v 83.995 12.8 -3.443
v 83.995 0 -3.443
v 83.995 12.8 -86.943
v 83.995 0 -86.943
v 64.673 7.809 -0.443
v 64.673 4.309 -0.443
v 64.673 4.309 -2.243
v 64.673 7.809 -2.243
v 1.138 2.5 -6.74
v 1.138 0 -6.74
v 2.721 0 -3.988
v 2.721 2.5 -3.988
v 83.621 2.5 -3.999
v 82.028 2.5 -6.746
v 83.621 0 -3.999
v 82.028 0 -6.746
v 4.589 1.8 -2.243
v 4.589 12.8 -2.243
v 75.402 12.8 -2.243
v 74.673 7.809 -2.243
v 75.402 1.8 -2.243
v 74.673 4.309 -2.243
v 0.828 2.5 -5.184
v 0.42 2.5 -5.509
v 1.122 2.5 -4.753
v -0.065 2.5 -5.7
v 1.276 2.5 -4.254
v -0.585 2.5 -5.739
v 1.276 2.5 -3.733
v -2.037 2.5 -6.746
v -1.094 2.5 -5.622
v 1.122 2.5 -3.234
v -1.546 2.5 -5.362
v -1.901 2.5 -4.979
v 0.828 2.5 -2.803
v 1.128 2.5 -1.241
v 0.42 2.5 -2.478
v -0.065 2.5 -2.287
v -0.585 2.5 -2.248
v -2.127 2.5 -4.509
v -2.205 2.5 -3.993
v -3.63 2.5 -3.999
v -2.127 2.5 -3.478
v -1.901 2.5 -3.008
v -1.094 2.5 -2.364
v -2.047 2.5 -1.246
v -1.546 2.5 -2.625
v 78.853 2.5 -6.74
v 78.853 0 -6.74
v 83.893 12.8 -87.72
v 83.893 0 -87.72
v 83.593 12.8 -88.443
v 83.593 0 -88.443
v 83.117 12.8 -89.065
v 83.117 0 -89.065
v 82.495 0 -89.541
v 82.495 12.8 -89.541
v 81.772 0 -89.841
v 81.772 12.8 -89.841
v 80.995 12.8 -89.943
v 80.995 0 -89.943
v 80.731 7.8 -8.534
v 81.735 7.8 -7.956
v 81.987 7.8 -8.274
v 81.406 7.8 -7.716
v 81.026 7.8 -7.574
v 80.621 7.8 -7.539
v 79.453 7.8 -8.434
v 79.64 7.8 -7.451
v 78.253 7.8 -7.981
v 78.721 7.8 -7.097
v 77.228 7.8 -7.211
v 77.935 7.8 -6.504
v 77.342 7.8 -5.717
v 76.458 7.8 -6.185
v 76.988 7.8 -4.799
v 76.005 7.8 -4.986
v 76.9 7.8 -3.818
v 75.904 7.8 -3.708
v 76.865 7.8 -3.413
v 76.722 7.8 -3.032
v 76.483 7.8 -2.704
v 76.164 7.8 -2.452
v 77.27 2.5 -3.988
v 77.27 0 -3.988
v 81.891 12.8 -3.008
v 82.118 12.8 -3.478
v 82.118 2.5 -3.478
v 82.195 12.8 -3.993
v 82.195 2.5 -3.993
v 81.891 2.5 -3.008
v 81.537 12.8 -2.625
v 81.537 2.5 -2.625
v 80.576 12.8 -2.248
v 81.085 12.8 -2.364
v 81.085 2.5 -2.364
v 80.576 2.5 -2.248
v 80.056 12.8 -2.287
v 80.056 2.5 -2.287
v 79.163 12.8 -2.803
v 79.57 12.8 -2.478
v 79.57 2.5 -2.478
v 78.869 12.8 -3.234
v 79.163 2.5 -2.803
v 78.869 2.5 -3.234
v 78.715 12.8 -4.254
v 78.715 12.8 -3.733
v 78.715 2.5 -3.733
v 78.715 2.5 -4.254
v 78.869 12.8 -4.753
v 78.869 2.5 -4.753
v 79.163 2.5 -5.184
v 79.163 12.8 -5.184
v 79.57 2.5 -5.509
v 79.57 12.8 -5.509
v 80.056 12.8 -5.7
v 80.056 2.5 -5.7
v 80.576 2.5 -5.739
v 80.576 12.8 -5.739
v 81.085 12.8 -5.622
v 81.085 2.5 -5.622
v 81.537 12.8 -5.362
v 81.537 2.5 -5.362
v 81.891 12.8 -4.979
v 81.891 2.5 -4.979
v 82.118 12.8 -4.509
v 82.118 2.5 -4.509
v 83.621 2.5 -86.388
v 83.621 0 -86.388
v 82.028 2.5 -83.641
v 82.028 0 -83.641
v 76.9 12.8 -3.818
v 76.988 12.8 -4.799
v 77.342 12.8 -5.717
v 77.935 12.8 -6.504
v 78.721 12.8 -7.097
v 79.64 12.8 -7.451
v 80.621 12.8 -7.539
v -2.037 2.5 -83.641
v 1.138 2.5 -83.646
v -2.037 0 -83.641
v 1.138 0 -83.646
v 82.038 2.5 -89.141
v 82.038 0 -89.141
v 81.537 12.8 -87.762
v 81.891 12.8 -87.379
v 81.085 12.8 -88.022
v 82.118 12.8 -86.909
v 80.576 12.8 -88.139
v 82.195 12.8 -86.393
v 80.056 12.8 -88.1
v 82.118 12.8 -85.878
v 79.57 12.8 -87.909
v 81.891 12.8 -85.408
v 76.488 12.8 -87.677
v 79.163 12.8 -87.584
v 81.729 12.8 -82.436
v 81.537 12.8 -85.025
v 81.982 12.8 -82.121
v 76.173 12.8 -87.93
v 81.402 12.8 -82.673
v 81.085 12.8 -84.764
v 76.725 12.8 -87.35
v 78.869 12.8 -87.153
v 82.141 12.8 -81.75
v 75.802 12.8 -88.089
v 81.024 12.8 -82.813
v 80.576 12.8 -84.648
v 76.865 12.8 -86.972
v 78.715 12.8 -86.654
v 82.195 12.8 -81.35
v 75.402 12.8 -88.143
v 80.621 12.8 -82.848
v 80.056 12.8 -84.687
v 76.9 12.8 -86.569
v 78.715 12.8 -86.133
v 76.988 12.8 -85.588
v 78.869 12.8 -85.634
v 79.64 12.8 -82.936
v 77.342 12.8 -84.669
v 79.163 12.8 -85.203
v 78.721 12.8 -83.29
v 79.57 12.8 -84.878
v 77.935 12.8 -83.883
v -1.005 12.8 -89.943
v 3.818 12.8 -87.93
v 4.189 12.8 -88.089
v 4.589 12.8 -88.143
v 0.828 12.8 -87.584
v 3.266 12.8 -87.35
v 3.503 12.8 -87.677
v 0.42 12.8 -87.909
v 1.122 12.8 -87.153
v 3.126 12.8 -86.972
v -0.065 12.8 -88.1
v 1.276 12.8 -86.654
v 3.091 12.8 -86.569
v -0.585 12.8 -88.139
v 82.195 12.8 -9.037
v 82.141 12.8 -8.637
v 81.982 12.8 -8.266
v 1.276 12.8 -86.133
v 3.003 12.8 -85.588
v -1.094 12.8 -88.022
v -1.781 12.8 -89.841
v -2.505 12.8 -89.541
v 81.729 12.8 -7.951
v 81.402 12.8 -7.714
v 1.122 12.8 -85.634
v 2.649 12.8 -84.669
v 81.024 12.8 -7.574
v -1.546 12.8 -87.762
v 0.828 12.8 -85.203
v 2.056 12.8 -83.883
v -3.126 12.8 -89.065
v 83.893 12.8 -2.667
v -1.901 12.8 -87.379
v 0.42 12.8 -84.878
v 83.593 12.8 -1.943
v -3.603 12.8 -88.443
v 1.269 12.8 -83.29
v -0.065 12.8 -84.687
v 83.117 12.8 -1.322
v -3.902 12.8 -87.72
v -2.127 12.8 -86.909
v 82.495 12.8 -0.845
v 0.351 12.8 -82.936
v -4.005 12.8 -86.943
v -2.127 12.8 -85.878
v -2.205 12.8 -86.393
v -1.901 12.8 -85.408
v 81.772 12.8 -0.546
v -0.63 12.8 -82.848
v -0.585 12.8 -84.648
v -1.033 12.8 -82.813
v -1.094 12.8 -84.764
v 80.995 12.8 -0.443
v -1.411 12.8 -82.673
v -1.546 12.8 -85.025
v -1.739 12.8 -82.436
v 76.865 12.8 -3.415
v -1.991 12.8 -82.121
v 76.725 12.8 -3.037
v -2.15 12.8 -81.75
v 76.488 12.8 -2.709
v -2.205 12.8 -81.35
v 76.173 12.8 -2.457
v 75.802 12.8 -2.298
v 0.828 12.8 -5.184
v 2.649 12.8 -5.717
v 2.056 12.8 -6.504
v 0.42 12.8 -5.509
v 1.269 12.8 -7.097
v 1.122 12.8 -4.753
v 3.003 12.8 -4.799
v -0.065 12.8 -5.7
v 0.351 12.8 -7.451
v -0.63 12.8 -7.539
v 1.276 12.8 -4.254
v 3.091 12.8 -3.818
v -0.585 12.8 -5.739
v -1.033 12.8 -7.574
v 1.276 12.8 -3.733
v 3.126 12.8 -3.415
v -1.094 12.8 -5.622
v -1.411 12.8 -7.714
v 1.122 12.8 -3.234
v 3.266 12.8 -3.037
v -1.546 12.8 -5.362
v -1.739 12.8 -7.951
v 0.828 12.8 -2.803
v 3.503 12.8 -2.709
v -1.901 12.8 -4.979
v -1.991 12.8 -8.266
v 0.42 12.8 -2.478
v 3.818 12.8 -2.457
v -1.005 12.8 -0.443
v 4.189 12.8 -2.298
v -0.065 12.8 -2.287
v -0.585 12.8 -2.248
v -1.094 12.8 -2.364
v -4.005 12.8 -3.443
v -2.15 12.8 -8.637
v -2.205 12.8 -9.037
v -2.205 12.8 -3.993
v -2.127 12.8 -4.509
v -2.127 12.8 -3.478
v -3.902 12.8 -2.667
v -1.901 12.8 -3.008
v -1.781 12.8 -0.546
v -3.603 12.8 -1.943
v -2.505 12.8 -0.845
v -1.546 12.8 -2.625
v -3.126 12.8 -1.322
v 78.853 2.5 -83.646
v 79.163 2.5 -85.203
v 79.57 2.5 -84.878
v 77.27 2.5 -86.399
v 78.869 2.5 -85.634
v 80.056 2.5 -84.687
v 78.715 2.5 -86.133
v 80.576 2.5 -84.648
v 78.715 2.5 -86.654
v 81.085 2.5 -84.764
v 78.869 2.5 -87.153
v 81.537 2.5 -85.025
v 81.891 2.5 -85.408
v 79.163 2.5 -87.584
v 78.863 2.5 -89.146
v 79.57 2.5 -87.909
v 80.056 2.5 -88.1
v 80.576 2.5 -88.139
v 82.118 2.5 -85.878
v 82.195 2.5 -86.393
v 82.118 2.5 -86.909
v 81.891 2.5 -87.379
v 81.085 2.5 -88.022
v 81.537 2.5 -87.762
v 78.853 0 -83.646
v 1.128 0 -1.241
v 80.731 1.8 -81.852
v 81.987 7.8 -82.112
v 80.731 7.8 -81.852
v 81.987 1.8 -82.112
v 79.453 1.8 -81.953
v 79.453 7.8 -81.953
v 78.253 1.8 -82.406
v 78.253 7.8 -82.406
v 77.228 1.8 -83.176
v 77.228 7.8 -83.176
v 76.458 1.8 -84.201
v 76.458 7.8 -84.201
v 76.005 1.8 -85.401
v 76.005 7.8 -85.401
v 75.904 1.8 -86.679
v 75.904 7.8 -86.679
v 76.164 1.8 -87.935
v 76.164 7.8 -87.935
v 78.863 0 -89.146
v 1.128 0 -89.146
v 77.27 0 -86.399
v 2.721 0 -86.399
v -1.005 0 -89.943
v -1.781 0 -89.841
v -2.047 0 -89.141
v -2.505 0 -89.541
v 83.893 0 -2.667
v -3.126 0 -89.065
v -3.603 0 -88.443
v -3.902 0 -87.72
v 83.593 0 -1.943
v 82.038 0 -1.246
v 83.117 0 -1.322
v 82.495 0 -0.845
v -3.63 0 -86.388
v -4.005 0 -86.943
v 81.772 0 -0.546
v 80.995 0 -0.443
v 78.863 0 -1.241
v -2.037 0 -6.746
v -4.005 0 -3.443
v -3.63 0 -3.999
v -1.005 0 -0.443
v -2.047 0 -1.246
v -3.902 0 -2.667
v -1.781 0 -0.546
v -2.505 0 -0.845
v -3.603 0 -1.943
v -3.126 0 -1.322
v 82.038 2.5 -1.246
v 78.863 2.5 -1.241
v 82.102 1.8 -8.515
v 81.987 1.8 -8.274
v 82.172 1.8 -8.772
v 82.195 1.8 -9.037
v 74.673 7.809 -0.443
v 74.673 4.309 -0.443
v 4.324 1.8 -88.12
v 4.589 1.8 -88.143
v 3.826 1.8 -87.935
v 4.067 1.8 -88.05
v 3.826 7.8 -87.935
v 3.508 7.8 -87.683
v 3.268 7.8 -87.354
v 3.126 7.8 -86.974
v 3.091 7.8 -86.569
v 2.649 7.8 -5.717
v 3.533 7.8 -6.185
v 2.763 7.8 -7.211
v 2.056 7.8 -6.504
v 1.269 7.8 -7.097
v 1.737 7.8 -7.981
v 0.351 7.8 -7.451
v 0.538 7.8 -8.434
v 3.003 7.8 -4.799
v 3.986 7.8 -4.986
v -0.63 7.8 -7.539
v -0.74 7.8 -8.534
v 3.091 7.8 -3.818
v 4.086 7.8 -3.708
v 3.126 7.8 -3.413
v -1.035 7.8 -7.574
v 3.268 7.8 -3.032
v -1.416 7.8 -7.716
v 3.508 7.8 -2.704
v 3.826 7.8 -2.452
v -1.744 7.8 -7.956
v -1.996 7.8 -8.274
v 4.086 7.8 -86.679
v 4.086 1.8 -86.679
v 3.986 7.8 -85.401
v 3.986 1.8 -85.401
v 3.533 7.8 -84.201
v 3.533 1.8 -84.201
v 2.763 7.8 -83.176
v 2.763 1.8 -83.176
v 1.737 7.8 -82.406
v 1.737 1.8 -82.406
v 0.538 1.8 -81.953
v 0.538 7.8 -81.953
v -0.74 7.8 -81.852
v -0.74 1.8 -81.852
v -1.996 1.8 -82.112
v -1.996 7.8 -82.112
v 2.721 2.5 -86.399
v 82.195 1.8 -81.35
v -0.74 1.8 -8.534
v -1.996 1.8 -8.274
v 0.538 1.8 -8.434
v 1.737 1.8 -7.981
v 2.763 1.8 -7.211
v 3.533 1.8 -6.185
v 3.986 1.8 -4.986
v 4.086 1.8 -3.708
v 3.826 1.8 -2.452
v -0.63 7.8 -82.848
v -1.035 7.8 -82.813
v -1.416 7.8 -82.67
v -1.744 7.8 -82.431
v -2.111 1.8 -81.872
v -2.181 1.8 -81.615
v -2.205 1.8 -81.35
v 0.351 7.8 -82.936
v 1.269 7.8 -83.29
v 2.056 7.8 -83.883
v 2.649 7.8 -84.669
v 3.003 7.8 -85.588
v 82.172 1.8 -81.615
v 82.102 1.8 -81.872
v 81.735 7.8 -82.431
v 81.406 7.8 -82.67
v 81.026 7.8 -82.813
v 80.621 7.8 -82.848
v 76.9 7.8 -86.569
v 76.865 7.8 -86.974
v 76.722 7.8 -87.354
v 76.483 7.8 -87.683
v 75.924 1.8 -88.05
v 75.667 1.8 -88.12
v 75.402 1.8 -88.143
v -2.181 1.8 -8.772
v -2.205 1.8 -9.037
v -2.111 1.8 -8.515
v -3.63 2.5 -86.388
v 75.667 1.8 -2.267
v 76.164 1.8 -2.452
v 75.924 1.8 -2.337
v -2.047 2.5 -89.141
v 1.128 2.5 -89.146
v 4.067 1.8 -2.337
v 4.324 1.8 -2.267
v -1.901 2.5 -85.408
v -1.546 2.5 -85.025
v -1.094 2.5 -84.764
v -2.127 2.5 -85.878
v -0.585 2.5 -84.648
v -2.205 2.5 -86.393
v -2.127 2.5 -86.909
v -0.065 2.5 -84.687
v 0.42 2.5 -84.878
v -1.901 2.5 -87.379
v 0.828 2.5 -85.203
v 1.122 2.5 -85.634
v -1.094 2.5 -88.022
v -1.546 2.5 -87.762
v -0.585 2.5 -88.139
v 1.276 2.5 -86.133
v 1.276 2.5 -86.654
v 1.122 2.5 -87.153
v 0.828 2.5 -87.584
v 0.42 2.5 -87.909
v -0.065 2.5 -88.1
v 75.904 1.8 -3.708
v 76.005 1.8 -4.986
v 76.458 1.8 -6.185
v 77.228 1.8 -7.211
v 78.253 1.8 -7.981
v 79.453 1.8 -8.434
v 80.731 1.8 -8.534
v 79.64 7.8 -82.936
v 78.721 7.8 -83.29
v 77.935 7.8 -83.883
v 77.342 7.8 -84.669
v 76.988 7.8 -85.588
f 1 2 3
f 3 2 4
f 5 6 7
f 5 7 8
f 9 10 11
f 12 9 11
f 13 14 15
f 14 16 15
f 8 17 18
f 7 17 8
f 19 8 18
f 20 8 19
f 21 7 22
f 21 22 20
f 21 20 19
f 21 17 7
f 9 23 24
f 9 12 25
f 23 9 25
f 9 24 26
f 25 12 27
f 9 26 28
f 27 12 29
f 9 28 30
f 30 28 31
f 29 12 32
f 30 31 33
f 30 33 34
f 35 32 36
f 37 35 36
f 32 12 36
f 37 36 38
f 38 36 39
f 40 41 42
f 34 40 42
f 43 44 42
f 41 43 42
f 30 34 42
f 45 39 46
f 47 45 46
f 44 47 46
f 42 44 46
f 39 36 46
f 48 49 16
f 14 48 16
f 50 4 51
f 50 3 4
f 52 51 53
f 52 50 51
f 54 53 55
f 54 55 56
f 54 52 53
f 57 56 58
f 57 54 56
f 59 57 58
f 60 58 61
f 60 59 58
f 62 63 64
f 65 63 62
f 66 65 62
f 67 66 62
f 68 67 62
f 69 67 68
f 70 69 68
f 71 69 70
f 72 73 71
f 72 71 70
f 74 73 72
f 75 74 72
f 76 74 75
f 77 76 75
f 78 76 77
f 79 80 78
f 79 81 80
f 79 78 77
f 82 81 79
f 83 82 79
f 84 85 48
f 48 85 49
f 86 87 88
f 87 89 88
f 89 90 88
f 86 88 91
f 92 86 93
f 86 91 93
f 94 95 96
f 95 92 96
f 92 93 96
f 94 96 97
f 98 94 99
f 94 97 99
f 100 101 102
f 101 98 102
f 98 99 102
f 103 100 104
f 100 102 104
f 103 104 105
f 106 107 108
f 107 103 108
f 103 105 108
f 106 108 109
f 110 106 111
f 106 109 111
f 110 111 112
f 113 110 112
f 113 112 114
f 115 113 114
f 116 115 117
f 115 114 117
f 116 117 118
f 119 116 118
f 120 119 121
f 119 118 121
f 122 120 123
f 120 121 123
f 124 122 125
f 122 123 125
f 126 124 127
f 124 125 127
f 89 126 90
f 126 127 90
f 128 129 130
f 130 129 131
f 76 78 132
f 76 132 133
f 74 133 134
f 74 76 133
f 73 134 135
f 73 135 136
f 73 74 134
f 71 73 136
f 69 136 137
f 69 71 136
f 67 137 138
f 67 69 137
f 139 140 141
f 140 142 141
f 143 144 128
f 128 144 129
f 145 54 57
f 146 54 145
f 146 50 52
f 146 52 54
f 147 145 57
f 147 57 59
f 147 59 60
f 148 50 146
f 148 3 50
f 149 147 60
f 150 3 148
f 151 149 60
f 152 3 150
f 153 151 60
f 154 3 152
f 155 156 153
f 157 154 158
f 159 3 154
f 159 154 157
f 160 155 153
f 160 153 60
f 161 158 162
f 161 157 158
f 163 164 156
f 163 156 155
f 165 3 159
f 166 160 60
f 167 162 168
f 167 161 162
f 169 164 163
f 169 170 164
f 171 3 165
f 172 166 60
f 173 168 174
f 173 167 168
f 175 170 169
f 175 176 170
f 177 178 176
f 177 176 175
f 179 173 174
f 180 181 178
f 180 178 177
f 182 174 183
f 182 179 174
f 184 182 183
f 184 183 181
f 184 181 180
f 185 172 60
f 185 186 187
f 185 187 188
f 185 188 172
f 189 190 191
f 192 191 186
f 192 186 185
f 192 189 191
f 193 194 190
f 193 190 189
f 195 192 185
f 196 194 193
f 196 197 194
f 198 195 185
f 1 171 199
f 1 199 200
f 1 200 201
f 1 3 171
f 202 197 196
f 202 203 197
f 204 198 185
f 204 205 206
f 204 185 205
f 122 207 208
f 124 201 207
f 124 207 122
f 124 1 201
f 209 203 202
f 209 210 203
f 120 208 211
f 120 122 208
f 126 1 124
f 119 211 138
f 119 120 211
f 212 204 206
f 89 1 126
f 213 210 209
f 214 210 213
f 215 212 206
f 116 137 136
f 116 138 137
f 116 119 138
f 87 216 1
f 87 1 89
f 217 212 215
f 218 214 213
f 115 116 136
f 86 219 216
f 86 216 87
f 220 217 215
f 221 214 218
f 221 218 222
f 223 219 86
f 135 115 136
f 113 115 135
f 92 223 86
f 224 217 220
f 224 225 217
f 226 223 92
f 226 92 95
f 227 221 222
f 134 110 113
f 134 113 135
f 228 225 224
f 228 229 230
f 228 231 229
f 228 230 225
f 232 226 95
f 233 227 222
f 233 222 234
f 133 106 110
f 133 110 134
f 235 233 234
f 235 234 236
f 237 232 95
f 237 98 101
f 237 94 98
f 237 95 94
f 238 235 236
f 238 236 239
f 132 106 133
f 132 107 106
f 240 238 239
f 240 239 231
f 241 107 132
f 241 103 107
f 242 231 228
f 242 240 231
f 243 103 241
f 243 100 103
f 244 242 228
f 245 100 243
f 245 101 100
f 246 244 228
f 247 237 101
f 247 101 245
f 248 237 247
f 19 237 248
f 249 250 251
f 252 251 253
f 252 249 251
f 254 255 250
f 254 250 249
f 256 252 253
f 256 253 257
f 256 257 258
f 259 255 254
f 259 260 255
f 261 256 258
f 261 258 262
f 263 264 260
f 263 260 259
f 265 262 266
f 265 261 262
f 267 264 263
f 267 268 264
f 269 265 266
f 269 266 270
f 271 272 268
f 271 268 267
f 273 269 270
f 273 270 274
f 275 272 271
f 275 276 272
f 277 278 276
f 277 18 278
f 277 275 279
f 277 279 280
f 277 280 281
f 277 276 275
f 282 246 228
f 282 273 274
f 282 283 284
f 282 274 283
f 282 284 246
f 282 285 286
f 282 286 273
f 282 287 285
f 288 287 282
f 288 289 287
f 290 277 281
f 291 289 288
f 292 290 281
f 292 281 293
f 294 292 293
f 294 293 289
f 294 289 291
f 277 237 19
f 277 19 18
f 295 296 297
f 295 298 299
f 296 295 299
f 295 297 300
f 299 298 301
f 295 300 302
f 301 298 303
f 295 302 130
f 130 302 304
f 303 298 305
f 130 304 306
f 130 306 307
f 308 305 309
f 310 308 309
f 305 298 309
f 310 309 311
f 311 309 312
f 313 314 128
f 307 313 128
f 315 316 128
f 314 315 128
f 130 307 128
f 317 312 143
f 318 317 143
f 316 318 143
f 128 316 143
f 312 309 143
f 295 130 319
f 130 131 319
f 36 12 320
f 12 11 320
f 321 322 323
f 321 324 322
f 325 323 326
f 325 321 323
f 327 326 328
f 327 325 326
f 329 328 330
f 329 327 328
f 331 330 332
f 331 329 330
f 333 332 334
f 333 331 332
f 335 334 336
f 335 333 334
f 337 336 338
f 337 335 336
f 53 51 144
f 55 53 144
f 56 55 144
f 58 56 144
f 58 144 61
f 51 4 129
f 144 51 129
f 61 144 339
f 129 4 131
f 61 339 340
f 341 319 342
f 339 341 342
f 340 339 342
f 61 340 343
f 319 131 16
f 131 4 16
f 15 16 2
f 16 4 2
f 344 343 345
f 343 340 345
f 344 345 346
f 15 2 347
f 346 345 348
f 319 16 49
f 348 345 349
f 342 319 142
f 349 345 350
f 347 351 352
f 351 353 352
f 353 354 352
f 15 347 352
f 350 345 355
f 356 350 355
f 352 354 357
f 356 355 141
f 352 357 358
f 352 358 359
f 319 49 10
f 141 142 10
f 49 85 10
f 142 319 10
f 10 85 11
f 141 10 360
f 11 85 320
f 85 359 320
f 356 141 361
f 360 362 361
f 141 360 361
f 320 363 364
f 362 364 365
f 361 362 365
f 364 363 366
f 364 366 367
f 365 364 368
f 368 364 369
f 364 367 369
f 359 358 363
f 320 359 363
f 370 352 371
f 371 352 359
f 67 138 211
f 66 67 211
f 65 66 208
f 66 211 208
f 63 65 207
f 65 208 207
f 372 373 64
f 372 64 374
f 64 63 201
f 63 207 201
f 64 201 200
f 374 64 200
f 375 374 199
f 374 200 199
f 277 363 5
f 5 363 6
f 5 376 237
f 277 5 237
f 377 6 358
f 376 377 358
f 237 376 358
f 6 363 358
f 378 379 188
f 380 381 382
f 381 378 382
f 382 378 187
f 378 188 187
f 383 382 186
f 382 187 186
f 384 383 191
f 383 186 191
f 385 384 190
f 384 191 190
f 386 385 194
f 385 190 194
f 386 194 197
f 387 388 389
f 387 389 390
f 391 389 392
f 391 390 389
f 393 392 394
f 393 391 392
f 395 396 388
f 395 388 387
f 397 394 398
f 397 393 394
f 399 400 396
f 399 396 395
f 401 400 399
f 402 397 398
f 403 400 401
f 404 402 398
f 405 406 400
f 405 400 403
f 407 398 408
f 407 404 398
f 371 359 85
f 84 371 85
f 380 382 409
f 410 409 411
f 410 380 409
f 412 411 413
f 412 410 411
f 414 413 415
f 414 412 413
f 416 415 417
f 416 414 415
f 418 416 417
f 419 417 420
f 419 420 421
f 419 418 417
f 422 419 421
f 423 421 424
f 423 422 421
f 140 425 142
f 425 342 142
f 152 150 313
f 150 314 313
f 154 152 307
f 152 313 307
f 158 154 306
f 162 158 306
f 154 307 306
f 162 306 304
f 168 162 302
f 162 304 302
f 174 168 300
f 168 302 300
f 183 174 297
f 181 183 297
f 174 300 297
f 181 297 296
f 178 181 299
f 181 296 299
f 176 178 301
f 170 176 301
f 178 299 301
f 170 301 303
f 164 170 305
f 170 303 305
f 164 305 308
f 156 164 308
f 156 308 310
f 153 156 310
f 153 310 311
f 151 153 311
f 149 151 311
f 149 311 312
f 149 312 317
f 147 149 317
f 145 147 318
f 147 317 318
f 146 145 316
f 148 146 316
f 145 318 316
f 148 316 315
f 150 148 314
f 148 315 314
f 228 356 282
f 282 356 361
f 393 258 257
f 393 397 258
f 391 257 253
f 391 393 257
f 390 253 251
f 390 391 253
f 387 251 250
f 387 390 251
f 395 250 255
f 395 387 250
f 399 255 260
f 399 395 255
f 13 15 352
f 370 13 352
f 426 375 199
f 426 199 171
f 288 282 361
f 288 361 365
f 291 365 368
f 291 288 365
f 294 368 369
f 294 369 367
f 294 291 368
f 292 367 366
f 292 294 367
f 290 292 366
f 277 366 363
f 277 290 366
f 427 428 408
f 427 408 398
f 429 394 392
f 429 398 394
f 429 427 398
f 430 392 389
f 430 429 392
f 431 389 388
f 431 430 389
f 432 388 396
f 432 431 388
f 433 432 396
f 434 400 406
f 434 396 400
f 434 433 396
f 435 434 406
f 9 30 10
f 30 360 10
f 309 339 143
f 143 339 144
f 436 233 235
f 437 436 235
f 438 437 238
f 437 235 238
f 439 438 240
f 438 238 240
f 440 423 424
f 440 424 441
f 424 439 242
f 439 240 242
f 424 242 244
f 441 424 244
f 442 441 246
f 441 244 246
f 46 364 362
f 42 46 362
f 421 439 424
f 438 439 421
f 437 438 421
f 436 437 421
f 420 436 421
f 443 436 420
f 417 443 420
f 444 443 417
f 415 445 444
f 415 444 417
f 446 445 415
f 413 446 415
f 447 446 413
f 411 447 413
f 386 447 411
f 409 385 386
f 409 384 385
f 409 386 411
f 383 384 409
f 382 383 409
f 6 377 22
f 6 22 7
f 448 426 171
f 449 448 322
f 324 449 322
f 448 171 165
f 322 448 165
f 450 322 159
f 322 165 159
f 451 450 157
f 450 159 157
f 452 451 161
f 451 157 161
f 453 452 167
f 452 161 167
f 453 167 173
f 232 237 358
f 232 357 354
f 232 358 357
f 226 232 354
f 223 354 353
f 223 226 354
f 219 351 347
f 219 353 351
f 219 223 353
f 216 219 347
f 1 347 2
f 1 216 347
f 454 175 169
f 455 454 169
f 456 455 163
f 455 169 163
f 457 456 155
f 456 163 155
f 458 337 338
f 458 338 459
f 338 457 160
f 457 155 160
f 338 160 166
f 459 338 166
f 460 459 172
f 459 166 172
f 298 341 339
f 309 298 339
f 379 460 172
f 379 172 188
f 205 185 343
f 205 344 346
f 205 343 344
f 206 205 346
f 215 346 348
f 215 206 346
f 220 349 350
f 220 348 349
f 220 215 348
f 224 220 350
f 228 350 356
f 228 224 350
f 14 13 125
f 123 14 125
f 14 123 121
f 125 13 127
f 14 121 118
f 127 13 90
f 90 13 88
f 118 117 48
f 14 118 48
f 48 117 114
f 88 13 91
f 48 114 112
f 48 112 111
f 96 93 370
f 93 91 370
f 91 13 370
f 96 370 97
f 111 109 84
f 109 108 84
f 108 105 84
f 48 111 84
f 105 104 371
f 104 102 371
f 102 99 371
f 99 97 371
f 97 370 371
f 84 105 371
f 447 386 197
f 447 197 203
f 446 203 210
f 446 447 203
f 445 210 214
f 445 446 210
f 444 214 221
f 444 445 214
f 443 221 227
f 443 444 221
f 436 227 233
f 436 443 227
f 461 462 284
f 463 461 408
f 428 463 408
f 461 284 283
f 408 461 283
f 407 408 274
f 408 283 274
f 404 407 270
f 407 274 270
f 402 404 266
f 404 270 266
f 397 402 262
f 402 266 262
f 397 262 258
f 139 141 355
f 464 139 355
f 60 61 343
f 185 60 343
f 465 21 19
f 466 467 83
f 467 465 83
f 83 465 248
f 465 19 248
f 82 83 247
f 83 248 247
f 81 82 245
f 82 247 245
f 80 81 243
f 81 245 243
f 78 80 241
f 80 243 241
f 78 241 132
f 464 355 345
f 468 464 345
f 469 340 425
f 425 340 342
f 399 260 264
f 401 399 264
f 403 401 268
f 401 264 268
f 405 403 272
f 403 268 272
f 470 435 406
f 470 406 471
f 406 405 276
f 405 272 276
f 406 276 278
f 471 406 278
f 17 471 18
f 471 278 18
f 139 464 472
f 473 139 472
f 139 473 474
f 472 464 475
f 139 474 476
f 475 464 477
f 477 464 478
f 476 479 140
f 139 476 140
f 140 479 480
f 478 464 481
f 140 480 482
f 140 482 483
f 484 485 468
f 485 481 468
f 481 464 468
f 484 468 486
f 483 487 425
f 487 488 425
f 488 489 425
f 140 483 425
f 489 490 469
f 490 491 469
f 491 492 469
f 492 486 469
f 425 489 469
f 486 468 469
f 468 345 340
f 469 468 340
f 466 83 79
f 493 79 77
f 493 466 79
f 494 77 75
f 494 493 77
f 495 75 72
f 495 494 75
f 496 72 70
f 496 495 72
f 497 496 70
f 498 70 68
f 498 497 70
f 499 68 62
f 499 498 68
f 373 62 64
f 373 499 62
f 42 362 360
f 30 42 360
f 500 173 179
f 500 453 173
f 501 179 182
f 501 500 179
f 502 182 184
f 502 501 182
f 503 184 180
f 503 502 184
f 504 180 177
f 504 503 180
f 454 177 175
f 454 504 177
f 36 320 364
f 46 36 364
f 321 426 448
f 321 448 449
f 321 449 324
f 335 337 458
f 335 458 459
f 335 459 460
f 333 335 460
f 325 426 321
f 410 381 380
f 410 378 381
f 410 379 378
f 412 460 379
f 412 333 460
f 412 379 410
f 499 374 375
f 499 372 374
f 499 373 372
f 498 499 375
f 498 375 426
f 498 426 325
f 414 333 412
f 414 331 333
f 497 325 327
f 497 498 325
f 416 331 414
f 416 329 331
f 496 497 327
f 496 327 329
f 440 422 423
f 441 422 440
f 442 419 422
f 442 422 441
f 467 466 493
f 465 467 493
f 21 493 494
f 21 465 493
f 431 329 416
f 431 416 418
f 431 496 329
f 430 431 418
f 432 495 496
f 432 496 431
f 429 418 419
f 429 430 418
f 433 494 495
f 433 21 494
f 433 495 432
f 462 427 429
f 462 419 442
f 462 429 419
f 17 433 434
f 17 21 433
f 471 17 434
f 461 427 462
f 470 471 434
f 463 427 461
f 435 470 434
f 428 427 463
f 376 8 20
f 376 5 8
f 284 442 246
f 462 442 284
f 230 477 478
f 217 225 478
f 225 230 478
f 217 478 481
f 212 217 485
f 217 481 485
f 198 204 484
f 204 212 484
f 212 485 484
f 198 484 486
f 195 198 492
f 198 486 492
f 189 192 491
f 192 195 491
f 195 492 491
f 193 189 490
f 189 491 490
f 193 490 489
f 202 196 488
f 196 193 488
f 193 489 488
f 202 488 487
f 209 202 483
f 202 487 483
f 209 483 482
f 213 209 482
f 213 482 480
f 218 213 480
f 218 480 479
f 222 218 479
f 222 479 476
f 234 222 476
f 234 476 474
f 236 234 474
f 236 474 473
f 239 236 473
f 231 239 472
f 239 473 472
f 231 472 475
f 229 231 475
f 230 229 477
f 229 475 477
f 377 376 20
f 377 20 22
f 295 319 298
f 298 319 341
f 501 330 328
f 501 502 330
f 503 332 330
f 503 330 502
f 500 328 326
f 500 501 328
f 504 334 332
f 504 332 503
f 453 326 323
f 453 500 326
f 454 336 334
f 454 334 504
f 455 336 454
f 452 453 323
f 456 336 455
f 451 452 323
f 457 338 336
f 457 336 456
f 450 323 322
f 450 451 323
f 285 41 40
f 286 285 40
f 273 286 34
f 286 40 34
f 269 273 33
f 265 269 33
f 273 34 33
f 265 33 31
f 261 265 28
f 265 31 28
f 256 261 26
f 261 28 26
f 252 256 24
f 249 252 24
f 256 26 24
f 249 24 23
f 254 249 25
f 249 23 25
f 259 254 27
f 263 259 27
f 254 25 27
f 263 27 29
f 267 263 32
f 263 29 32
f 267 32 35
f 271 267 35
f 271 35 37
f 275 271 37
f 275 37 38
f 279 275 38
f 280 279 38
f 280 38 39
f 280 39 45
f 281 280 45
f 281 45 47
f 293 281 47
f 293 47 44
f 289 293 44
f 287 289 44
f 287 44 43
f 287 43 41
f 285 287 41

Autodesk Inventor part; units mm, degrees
ref_plane "YZ Plane" through (0, 0, 0) normal (1, 0, 0) x (0, 1, 0)
ref_plane "XZ Plane" through (0, 0, 0) normal (0, 1, 0) x (-1, 0, 0)
ref_plane "XY Plane" through (0, 0, 0) normal (0, 0, 1) x (1, 0, 0)
sketch "bottom" plane through (0, 0, 0) normal (0, 1, 0) x (-1, 0, 0)
  line L0 (4.0046, -0.4434) -> (-83.9954, -0.4434)
  line L1 (-83.9954, -0.4434) -> (-83.9954, -89.9434)
  line L2 (-83.9954, -89.9434) -> (4.0046, -89.9434)
  line L3 (4.0046, -89.9434) -> (4.0046, -0.4434)
  line L4 (2.2046, -2.2434) -> (-82.1954, -2.2434)
  line L5 (-82.1954, -2.2434) -> (-82.1954, -88.1434)
  line L6 (-82.1954, -88.1434) -> (2.2046, -88.1434)
  line L7 (2.2046, -88.1434) -> (2.2046, -2.2434)
  circle A0 centre (0.4546, -3.9934) radius 3.55
  line L8 (-39.9954, -123.8489) -> (-39.9954, 33.4211)
  line L9 (23.3841, -45.1934) -> (-117.3219, -45.1934)
  circle A1 centre (0.4546, -3.9934) radius 1.75
  circle A2 centre (-80.4454, -3.9934) radius 3.55
  circle A3 centre (-80.4454, -3.9934) radius 1.75
  circle A4 centre (0.4546, -86.3934) radius 1.75
  circle A5 centre (0.4546, -86.3934) radius 3.55
  circle A6 centre (-80.4454, -86.3934) radius 1.75
  circle A7 centre (-80.4454, -86.3934) radius 3.55
  line L10 (3.6301, -3.9991) -> (2.0374, -6.7462)
  line L11 (2.0374, -6.7462) -> (-1.138, -6.7405)
  line L12 (-1.138, -6.7405) -> (-2.7208, -3.9877)
  line L13 (-2.7208, -3.9877) -> (-1.1282, -1.2406)
  line L14 (-1.1282, -1.2406) -> (2.0472, -1.2462)
  line L15 (2.0472, -1.2462) -> (3.6301, -3.9991)
  circle A8 centre (0.4546, -3.9934) radius 4.55
  point P0 (0, 0)
  point P1 (-39.9954, -45.1934)
  point P2 (-2.6341, -2.2434)
  point P3 (2.2046, -7.0821)
  point P4 (2.2046, -83.3047)
  point P5 (-2.6341, -88.1434)
  point P6 (-77.3567, -88.1434)
  point P7 (-82.1954, -83.3047)
  point P8 (-82.1954, -7.0821)
  point P9 (-77.3567, -2.2434)
  point P10 (-39.9954, -0.4434)
  point P11 (-39.9954, -2.2434)
  point P12 (2.2046, -45.1934)
  point P13 (4.0046, -45.1934)
  point P14 (-39.9954, -45.1934)
  point P15 (-3.7454, -2.2434)
  point P16 (2.2046, -8.1934)
  dimension "d0" = 88
  dimension "d1" = 89.5
  dimension "d2" = 84.4
  dimension "d3" = 85.9
  dimension "d4" = 1.8
  dimension "d5" = 1.8
  dimension "d6" = 7.1
  dimension "d7" = 3.55
  dimension "d8" = 3.55
  dimension "d9" = 3.5
  dimension "d10" = 88
  dimension "d11" = 89.5
  dimension "d12" = 44.75
  dimension "d13" = 44
  dimension "d33" = 2.75
  dimension "d36" = 9.1
ref_plane "Work Plane3" through (39.9954, 0, -45.1934) normal (0, 0, 1) x (1, 0, 0)
ref_plane "Work Plane4" through (39.9954, 0, -45.1934) normal (1, 0, 0) x (0, 1, 0)
extrude "Extrusion4" add sketch "bottom" along normal blind 12.8 contours L3 A8 L0 | A8 L3 A0 L0 | A0 L4 A8 L0 | A0 L7 L10 L15 L14 L13 L4 | A8 L4 L8 L0 | L3 A8 L7 A0 | L4 L13 L12 L11 L10 L7 A0 | L3 L9 L7 A8 | L13 L14 L15 L10 L7 L4 | L4 A1 L7 L10 L11 L12 L13 | L4 L7 A1
extrude "Extrusion5" add sketch "bottom" along normal blind 1.8 contours A0 L7 A8 L4 | A8 L7 L9 L8 L4
fillet "Fillet3" radius 3 1 edges at (-4.0046, 6.4, -0.4434)
fillet "Fillet4" radius 1.5 2 edges at (-2.2046, 7.3, -7.0821) (2.6341, 7.3, -2.2434)
extrude "Extrusion6" cut sketch "bottom" along normal blind 2.5 contours L13 L14 L15 L10 L7 L4 | L4 A1 L7 L10 L11 L12 L13 | L4 L7 A1
extrude "pcb hight" add sketch "bottom" along normal blind 7.8 contours A0 L7 A8 L4
mirror "Mirror3" about plane through (39.9954, 0, -45.1934) normal (0, 0, 1)
mirror "Mirror4" about plane through (39.9954, 0, -45.1934) normal (1, 0, 0)
sketch "Sketch4" plane through (-1.0046, 0, -0.4434) normal (0, 0, 1) x (1, 0, 0)
  line L0 (65.6777, 7.8088) -> (75.6777, 7.8088)
  line L1 (75.6777, 7.8088) -> (75.6777, 4.3088)
  line L2 (75.6777, 4.3088) -> (65.6777, 4.3088)
  line L3 (65.6777, 4.3088) -> (65.6777, 7.8088)
  point P0 (1.0046, 0)
  dimension "d39" = 10
  dimension "d40" = 3.5
extrude "Extrusion8" cut sketch "Sketch4" against normal blind 1.8
equation "\"d2\" = d0 - 2 * d4"
equation "\"d3\" = d1 - 2 * d5"
equation "\"d5\" = d4"
equation "\"d6\" = 2 * d4 + d9"
equation "\"d7\" = 0.5 * d6"
equation "\"d8\" = 0.5 * d6"
equation "\"d10\" = d0"
equation "\"d11\" = d1"
equation "\"d12\" = 0.5 * d1"
equation "\"d13\" = 0.5 * d0"
equation "\"d29\" = d4"
properties part number "base"
